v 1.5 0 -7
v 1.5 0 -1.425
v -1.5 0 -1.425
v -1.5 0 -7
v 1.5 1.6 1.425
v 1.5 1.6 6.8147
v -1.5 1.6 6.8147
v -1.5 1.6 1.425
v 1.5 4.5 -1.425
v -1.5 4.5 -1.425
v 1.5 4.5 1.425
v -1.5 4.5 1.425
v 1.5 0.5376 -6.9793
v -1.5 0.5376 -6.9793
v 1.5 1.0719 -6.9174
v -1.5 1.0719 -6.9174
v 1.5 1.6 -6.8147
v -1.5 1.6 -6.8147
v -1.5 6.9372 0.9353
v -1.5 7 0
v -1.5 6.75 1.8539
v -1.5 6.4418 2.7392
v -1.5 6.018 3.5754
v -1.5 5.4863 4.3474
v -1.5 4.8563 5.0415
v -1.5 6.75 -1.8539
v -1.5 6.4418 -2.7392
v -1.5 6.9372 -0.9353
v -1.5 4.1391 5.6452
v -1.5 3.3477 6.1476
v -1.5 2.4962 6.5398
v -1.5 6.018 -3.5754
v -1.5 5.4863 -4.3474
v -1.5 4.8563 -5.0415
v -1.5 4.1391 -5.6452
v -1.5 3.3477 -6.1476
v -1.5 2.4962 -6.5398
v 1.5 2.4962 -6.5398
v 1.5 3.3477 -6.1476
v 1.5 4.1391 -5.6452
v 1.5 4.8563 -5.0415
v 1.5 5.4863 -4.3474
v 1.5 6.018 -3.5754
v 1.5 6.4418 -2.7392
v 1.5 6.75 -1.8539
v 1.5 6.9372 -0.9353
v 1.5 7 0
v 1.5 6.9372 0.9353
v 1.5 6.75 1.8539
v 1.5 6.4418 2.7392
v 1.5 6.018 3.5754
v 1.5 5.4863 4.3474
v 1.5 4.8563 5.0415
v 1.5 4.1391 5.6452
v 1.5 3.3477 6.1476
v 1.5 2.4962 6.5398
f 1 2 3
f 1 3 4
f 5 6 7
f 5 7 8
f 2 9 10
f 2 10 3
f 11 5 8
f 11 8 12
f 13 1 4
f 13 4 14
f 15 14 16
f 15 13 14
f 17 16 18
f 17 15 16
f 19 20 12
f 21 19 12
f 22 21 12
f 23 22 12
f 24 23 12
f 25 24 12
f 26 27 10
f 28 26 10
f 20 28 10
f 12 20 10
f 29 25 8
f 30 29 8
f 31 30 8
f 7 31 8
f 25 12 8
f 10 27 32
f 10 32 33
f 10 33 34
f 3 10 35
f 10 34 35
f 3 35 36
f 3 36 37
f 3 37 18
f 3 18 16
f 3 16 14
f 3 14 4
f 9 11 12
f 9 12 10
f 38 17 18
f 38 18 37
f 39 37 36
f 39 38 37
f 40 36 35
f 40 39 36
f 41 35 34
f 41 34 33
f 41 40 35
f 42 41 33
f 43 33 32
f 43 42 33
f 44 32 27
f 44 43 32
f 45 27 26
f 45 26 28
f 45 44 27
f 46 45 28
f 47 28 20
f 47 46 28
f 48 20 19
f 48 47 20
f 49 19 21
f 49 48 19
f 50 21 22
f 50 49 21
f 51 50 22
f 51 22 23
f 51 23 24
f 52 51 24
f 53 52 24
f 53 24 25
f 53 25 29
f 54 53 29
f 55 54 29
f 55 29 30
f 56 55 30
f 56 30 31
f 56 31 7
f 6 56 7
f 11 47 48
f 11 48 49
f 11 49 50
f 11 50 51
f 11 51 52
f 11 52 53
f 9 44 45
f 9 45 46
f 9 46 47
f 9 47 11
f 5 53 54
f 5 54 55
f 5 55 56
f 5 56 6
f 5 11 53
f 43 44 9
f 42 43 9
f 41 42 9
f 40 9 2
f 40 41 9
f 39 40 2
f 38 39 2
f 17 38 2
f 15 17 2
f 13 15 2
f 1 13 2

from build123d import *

# Parameters (mm, degrees)
BOSS_EXTRUDE1_DEPTH      = 1.5
BOSS_EXTRUDE1_DEPTH_BACK = 1.5
BODY_MOVE_COPY1_ANGLE    = 90


with BuildPart() as part:
    # Sketch2 → Boss-Extrude1 (new, two sides: drawn at the far end of the back side and taken through both)
    with BuildSketch(Plane(origin=(0, 0, 0), x_dir=(1, 0, 0), z_dir=(0, 1, 0)).offset(-BOSS_EXTRUDE1_DEPTH_BACK)):
        with BuildLine():
            Line((1.6, 1.425), (0, 1.425))
            Line((0, 1.425), (0, 7))
            ThreePointArc((0, 7), (0.805347718, 6.953518178), (1.6, 6.814690015))
            ThreePointArc((1.6, 6.814690015), (7, 0), (1.6, -6.814690015))
            Line((1.6, -6.814690015), (1.6, -1.425))
            Line((1.6, -1.425), (4.5, -1.425))
            Line((4.5, -1.425), (4.5, 1.425))
            Line((4.5, 1.425), (1.6, 1.425))
        make_face()
    extrude(amount=BOSS_EXTRUDE1_DEPTH + BOSS_EXTRUDE1_DEPTH_BACK)


with BuildPart() as part_1:
    # Body-Move/Copy1: moved
    add(part.part.rotate(Axis((0, 0, 0), (0, 0, 1)), BODY_MOVE_COPY1_ANGLE))


solid = part_1.part
